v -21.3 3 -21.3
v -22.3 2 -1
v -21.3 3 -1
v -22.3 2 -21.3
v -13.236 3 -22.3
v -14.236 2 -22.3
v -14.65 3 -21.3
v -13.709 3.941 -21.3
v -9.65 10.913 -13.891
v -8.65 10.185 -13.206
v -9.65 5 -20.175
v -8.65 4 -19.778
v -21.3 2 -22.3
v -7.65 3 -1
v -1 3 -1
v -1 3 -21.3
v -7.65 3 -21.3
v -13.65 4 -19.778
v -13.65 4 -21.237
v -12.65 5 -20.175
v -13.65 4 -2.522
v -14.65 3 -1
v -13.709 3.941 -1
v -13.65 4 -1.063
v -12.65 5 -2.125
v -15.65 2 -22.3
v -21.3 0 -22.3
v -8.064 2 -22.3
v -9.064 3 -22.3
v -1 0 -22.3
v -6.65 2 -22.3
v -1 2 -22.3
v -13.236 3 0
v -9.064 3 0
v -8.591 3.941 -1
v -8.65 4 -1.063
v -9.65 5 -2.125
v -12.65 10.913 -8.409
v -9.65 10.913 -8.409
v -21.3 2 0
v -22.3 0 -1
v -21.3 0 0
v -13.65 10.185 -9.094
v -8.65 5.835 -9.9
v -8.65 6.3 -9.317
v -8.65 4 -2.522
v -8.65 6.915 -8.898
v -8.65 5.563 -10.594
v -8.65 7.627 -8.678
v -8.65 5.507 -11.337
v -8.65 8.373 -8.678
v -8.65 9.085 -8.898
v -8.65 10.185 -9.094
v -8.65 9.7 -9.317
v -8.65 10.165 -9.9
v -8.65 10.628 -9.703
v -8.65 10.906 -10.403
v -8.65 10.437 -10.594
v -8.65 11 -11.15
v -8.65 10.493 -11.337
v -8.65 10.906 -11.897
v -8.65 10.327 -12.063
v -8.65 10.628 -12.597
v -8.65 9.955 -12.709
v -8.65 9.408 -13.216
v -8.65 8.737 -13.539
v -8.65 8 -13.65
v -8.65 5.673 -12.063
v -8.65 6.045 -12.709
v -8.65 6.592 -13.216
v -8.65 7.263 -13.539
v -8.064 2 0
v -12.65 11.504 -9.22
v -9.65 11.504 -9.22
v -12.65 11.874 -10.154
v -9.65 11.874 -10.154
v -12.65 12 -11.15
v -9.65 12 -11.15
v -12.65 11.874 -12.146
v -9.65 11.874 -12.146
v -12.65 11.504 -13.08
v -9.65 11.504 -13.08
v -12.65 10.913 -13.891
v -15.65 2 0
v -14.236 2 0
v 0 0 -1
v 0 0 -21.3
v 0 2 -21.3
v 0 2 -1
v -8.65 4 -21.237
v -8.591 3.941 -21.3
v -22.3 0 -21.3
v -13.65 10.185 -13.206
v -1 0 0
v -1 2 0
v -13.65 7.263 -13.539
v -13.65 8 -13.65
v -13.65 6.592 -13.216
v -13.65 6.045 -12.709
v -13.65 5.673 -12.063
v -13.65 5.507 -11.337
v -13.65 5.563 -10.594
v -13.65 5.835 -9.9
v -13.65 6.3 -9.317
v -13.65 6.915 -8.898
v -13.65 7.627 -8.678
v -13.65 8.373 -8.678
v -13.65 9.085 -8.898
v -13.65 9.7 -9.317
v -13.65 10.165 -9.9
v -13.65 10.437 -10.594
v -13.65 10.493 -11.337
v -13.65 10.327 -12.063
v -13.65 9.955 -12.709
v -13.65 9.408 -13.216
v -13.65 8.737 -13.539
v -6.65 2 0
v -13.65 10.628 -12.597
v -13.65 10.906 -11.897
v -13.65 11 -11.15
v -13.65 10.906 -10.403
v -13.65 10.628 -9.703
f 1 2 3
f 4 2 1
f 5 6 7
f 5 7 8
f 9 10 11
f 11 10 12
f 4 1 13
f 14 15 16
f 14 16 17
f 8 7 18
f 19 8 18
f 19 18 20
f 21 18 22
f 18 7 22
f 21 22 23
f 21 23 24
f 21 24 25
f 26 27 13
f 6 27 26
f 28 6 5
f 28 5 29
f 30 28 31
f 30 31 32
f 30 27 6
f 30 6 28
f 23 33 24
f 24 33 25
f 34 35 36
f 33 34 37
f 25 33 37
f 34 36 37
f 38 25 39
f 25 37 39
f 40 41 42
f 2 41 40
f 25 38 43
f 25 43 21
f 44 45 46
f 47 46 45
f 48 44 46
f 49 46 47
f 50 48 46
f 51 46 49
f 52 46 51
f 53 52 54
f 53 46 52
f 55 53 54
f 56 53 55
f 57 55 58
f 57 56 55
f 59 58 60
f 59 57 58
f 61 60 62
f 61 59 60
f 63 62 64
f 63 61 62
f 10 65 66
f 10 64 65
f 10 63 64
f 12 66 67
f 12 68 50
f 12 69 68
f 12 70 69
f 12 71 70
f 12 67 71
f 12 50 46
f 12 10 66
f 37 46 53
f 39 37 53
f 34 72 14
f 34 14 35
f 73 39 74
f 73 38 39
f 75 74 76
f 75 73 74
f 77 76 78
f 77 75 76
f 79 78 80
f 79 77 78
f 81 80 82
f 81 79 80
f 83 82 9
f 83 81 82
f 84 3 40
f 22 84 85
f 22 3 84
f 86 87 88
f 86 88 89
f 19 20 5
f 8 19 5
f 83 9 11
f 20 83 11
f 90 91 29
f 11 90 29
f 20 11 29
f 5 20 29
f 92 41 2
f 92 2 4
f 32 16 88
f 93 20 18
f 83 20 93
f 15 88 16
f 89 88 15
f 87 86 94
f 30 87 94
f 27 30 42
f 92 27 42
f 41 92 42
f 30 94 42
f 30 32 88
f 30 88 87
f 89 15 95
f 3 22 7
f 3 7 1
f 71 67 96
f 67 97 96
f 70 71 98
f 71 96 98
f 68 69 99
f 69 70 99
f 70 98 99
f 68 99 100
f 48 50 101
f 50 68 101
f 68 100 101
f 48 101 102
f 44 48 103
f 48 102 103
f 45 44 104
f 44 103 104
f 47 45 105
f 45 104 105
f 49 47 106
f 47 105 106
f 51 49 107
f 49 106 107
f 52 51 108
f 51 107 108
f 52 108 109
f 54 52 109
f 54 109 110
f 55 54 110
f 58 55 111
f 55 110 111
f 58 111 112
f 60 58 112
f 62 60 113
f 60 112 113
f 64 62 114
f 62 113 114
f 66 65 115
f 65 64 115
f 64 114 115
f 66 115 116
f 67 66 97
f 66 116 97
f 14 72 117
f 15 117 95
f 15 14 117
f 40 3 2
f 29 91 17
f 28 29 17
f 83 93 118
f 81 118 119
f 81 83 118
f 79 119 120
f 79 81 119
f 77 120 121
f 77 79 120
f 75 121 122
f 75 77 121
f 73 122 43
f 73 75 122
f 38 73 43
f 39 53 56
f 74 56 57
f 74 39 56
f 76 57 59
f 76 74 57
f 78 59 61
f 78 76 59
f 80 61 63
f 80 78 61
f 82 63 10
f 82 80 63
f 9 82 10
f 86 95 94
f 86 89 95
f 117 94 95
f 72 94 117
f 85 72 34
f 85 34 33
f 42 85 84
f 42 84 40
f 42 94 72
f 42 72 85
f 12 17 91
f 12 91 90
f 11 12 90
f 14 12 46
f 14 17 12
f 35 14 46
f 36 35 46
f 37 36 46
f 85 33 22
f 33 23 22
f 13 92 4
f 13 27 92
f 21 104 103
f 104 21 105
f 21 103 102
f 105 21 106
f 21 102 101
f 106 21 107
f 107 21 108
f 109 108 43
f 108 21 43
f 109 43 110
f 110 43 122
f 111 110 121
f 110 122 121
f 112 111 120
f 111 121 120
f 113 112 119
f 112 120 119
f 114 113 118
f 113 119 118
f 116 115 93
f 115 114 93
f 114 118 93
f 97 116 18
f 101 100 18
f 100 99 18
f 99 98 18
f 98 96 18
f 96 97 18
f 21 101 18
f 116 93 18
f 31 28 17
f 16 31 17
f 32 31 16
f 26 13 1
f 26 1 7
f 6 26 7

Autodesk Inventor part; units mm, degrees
ref_plane "YZ Plane" through (0, 0, 0) normal (1, 0, 0) x (0, 1, 0)
ref_plane "XZ Plane" through (0, 0, 0) normal (0, 1, 0) x (-1, 0, 0)
ref_plane "XY Plane" through (0, 0, 0) normal (0, 0, 1) x (1, 0, 0)
sketch "Sketch1" plane through (0, 0, 0) normal (0, 1, 0) x (-1, 0, 0)
  line L0 (0, 0) -> (22.3, 0)
  line L1 (22.3, 0) -> (22.3, -22.3)
  line L2 (22.3, -22.3) -> (0, -22.3)
  line L3 (0, -22.3) -> (0, 0)
  dimension "d0" = 22.3
  dimension "d1" = 22.3
extrude "Extrusion1" add sketch "Sketch1" along normal blind 3
ref_plane "Work Plane1" through (-11.15, 0, 0) normal (1, 0, 0) x (0, 0, -1)
sketch "Sketch3" plane through (-11.15, 0, 0) normal (1, 0, 0) x (0, 0, -1)
  line L0 (0, 3) -> (22.3, 3) projected
  circle A0 centre (11.15, 8) radius 2.5
  arc A1 (13.8913, 10.913) -> (8.4087, 10.913) centre (11.15, 8) ccw
  line L1 (0, 0) -> (0, 3) projected
  line L2 (0, 3) -> (8.4087, 10.913)
  line L3 (13.8913, 10.913) -> (22.3, 3)
  dimension "d5" = 5
  dimension "d6" = 8
  dimension "d7" = 11.15
  dimension "d8" = 5
extrude "Extrusion2" add sketch "Sketch3" along normal mid plane 5
chamfer "Chamfer1" distance 1 angle 45 1 edges at (-8.65, 3, -11.15)
chamfer "Chamfer2" distance 1 angle 45 1 edges at (-13.65, 3, -11.15)
chamfer "Chamfer3" distance 1 angle 45 3 edges at (-13.65, 12, -11.15) (-13.65, 7.4565, -17.5643) (-13.65, 7.4565, -4.7357)
chamfer "Chamfer4" distance 1 angle 45 3 edges at (-8.65, 7.4565, -4.7357) (-8.65, 12, -11.15) (-8.65, 7.4565, -17.5643)
chamfer "Chamfer5" distance 1 angle 45 10 edges at (-18.475, 3, 0) (-22.3, 3, -11.15) (-3.825, 3, 0) (0, 3, -11.15) (-3.825, 3, -22.3) (-18.475, 3, -22.3) (0, 1.5, -22.3) (0, 1.5, 0) (-22.3, 1.5, -22.3) (-22.3, 1.5, 0)
chamfer "Chamfer6" distance 1 angle 45 2 edges at (-7.15, 2.5, 0) (-15.15, 2.5, 0)
chamfer "Chamfer7" distance 1 angle 45 2 edges at (-7.15, 2.5, -22.3) (-15.15, 2.5, -22.3)
equation "\"d1\" = d0"
equation "\"d7\" = 0.5 * d0"
equation "\"d4\" = -0.5 * d0"
properties part number "TrackPivotConnector"
